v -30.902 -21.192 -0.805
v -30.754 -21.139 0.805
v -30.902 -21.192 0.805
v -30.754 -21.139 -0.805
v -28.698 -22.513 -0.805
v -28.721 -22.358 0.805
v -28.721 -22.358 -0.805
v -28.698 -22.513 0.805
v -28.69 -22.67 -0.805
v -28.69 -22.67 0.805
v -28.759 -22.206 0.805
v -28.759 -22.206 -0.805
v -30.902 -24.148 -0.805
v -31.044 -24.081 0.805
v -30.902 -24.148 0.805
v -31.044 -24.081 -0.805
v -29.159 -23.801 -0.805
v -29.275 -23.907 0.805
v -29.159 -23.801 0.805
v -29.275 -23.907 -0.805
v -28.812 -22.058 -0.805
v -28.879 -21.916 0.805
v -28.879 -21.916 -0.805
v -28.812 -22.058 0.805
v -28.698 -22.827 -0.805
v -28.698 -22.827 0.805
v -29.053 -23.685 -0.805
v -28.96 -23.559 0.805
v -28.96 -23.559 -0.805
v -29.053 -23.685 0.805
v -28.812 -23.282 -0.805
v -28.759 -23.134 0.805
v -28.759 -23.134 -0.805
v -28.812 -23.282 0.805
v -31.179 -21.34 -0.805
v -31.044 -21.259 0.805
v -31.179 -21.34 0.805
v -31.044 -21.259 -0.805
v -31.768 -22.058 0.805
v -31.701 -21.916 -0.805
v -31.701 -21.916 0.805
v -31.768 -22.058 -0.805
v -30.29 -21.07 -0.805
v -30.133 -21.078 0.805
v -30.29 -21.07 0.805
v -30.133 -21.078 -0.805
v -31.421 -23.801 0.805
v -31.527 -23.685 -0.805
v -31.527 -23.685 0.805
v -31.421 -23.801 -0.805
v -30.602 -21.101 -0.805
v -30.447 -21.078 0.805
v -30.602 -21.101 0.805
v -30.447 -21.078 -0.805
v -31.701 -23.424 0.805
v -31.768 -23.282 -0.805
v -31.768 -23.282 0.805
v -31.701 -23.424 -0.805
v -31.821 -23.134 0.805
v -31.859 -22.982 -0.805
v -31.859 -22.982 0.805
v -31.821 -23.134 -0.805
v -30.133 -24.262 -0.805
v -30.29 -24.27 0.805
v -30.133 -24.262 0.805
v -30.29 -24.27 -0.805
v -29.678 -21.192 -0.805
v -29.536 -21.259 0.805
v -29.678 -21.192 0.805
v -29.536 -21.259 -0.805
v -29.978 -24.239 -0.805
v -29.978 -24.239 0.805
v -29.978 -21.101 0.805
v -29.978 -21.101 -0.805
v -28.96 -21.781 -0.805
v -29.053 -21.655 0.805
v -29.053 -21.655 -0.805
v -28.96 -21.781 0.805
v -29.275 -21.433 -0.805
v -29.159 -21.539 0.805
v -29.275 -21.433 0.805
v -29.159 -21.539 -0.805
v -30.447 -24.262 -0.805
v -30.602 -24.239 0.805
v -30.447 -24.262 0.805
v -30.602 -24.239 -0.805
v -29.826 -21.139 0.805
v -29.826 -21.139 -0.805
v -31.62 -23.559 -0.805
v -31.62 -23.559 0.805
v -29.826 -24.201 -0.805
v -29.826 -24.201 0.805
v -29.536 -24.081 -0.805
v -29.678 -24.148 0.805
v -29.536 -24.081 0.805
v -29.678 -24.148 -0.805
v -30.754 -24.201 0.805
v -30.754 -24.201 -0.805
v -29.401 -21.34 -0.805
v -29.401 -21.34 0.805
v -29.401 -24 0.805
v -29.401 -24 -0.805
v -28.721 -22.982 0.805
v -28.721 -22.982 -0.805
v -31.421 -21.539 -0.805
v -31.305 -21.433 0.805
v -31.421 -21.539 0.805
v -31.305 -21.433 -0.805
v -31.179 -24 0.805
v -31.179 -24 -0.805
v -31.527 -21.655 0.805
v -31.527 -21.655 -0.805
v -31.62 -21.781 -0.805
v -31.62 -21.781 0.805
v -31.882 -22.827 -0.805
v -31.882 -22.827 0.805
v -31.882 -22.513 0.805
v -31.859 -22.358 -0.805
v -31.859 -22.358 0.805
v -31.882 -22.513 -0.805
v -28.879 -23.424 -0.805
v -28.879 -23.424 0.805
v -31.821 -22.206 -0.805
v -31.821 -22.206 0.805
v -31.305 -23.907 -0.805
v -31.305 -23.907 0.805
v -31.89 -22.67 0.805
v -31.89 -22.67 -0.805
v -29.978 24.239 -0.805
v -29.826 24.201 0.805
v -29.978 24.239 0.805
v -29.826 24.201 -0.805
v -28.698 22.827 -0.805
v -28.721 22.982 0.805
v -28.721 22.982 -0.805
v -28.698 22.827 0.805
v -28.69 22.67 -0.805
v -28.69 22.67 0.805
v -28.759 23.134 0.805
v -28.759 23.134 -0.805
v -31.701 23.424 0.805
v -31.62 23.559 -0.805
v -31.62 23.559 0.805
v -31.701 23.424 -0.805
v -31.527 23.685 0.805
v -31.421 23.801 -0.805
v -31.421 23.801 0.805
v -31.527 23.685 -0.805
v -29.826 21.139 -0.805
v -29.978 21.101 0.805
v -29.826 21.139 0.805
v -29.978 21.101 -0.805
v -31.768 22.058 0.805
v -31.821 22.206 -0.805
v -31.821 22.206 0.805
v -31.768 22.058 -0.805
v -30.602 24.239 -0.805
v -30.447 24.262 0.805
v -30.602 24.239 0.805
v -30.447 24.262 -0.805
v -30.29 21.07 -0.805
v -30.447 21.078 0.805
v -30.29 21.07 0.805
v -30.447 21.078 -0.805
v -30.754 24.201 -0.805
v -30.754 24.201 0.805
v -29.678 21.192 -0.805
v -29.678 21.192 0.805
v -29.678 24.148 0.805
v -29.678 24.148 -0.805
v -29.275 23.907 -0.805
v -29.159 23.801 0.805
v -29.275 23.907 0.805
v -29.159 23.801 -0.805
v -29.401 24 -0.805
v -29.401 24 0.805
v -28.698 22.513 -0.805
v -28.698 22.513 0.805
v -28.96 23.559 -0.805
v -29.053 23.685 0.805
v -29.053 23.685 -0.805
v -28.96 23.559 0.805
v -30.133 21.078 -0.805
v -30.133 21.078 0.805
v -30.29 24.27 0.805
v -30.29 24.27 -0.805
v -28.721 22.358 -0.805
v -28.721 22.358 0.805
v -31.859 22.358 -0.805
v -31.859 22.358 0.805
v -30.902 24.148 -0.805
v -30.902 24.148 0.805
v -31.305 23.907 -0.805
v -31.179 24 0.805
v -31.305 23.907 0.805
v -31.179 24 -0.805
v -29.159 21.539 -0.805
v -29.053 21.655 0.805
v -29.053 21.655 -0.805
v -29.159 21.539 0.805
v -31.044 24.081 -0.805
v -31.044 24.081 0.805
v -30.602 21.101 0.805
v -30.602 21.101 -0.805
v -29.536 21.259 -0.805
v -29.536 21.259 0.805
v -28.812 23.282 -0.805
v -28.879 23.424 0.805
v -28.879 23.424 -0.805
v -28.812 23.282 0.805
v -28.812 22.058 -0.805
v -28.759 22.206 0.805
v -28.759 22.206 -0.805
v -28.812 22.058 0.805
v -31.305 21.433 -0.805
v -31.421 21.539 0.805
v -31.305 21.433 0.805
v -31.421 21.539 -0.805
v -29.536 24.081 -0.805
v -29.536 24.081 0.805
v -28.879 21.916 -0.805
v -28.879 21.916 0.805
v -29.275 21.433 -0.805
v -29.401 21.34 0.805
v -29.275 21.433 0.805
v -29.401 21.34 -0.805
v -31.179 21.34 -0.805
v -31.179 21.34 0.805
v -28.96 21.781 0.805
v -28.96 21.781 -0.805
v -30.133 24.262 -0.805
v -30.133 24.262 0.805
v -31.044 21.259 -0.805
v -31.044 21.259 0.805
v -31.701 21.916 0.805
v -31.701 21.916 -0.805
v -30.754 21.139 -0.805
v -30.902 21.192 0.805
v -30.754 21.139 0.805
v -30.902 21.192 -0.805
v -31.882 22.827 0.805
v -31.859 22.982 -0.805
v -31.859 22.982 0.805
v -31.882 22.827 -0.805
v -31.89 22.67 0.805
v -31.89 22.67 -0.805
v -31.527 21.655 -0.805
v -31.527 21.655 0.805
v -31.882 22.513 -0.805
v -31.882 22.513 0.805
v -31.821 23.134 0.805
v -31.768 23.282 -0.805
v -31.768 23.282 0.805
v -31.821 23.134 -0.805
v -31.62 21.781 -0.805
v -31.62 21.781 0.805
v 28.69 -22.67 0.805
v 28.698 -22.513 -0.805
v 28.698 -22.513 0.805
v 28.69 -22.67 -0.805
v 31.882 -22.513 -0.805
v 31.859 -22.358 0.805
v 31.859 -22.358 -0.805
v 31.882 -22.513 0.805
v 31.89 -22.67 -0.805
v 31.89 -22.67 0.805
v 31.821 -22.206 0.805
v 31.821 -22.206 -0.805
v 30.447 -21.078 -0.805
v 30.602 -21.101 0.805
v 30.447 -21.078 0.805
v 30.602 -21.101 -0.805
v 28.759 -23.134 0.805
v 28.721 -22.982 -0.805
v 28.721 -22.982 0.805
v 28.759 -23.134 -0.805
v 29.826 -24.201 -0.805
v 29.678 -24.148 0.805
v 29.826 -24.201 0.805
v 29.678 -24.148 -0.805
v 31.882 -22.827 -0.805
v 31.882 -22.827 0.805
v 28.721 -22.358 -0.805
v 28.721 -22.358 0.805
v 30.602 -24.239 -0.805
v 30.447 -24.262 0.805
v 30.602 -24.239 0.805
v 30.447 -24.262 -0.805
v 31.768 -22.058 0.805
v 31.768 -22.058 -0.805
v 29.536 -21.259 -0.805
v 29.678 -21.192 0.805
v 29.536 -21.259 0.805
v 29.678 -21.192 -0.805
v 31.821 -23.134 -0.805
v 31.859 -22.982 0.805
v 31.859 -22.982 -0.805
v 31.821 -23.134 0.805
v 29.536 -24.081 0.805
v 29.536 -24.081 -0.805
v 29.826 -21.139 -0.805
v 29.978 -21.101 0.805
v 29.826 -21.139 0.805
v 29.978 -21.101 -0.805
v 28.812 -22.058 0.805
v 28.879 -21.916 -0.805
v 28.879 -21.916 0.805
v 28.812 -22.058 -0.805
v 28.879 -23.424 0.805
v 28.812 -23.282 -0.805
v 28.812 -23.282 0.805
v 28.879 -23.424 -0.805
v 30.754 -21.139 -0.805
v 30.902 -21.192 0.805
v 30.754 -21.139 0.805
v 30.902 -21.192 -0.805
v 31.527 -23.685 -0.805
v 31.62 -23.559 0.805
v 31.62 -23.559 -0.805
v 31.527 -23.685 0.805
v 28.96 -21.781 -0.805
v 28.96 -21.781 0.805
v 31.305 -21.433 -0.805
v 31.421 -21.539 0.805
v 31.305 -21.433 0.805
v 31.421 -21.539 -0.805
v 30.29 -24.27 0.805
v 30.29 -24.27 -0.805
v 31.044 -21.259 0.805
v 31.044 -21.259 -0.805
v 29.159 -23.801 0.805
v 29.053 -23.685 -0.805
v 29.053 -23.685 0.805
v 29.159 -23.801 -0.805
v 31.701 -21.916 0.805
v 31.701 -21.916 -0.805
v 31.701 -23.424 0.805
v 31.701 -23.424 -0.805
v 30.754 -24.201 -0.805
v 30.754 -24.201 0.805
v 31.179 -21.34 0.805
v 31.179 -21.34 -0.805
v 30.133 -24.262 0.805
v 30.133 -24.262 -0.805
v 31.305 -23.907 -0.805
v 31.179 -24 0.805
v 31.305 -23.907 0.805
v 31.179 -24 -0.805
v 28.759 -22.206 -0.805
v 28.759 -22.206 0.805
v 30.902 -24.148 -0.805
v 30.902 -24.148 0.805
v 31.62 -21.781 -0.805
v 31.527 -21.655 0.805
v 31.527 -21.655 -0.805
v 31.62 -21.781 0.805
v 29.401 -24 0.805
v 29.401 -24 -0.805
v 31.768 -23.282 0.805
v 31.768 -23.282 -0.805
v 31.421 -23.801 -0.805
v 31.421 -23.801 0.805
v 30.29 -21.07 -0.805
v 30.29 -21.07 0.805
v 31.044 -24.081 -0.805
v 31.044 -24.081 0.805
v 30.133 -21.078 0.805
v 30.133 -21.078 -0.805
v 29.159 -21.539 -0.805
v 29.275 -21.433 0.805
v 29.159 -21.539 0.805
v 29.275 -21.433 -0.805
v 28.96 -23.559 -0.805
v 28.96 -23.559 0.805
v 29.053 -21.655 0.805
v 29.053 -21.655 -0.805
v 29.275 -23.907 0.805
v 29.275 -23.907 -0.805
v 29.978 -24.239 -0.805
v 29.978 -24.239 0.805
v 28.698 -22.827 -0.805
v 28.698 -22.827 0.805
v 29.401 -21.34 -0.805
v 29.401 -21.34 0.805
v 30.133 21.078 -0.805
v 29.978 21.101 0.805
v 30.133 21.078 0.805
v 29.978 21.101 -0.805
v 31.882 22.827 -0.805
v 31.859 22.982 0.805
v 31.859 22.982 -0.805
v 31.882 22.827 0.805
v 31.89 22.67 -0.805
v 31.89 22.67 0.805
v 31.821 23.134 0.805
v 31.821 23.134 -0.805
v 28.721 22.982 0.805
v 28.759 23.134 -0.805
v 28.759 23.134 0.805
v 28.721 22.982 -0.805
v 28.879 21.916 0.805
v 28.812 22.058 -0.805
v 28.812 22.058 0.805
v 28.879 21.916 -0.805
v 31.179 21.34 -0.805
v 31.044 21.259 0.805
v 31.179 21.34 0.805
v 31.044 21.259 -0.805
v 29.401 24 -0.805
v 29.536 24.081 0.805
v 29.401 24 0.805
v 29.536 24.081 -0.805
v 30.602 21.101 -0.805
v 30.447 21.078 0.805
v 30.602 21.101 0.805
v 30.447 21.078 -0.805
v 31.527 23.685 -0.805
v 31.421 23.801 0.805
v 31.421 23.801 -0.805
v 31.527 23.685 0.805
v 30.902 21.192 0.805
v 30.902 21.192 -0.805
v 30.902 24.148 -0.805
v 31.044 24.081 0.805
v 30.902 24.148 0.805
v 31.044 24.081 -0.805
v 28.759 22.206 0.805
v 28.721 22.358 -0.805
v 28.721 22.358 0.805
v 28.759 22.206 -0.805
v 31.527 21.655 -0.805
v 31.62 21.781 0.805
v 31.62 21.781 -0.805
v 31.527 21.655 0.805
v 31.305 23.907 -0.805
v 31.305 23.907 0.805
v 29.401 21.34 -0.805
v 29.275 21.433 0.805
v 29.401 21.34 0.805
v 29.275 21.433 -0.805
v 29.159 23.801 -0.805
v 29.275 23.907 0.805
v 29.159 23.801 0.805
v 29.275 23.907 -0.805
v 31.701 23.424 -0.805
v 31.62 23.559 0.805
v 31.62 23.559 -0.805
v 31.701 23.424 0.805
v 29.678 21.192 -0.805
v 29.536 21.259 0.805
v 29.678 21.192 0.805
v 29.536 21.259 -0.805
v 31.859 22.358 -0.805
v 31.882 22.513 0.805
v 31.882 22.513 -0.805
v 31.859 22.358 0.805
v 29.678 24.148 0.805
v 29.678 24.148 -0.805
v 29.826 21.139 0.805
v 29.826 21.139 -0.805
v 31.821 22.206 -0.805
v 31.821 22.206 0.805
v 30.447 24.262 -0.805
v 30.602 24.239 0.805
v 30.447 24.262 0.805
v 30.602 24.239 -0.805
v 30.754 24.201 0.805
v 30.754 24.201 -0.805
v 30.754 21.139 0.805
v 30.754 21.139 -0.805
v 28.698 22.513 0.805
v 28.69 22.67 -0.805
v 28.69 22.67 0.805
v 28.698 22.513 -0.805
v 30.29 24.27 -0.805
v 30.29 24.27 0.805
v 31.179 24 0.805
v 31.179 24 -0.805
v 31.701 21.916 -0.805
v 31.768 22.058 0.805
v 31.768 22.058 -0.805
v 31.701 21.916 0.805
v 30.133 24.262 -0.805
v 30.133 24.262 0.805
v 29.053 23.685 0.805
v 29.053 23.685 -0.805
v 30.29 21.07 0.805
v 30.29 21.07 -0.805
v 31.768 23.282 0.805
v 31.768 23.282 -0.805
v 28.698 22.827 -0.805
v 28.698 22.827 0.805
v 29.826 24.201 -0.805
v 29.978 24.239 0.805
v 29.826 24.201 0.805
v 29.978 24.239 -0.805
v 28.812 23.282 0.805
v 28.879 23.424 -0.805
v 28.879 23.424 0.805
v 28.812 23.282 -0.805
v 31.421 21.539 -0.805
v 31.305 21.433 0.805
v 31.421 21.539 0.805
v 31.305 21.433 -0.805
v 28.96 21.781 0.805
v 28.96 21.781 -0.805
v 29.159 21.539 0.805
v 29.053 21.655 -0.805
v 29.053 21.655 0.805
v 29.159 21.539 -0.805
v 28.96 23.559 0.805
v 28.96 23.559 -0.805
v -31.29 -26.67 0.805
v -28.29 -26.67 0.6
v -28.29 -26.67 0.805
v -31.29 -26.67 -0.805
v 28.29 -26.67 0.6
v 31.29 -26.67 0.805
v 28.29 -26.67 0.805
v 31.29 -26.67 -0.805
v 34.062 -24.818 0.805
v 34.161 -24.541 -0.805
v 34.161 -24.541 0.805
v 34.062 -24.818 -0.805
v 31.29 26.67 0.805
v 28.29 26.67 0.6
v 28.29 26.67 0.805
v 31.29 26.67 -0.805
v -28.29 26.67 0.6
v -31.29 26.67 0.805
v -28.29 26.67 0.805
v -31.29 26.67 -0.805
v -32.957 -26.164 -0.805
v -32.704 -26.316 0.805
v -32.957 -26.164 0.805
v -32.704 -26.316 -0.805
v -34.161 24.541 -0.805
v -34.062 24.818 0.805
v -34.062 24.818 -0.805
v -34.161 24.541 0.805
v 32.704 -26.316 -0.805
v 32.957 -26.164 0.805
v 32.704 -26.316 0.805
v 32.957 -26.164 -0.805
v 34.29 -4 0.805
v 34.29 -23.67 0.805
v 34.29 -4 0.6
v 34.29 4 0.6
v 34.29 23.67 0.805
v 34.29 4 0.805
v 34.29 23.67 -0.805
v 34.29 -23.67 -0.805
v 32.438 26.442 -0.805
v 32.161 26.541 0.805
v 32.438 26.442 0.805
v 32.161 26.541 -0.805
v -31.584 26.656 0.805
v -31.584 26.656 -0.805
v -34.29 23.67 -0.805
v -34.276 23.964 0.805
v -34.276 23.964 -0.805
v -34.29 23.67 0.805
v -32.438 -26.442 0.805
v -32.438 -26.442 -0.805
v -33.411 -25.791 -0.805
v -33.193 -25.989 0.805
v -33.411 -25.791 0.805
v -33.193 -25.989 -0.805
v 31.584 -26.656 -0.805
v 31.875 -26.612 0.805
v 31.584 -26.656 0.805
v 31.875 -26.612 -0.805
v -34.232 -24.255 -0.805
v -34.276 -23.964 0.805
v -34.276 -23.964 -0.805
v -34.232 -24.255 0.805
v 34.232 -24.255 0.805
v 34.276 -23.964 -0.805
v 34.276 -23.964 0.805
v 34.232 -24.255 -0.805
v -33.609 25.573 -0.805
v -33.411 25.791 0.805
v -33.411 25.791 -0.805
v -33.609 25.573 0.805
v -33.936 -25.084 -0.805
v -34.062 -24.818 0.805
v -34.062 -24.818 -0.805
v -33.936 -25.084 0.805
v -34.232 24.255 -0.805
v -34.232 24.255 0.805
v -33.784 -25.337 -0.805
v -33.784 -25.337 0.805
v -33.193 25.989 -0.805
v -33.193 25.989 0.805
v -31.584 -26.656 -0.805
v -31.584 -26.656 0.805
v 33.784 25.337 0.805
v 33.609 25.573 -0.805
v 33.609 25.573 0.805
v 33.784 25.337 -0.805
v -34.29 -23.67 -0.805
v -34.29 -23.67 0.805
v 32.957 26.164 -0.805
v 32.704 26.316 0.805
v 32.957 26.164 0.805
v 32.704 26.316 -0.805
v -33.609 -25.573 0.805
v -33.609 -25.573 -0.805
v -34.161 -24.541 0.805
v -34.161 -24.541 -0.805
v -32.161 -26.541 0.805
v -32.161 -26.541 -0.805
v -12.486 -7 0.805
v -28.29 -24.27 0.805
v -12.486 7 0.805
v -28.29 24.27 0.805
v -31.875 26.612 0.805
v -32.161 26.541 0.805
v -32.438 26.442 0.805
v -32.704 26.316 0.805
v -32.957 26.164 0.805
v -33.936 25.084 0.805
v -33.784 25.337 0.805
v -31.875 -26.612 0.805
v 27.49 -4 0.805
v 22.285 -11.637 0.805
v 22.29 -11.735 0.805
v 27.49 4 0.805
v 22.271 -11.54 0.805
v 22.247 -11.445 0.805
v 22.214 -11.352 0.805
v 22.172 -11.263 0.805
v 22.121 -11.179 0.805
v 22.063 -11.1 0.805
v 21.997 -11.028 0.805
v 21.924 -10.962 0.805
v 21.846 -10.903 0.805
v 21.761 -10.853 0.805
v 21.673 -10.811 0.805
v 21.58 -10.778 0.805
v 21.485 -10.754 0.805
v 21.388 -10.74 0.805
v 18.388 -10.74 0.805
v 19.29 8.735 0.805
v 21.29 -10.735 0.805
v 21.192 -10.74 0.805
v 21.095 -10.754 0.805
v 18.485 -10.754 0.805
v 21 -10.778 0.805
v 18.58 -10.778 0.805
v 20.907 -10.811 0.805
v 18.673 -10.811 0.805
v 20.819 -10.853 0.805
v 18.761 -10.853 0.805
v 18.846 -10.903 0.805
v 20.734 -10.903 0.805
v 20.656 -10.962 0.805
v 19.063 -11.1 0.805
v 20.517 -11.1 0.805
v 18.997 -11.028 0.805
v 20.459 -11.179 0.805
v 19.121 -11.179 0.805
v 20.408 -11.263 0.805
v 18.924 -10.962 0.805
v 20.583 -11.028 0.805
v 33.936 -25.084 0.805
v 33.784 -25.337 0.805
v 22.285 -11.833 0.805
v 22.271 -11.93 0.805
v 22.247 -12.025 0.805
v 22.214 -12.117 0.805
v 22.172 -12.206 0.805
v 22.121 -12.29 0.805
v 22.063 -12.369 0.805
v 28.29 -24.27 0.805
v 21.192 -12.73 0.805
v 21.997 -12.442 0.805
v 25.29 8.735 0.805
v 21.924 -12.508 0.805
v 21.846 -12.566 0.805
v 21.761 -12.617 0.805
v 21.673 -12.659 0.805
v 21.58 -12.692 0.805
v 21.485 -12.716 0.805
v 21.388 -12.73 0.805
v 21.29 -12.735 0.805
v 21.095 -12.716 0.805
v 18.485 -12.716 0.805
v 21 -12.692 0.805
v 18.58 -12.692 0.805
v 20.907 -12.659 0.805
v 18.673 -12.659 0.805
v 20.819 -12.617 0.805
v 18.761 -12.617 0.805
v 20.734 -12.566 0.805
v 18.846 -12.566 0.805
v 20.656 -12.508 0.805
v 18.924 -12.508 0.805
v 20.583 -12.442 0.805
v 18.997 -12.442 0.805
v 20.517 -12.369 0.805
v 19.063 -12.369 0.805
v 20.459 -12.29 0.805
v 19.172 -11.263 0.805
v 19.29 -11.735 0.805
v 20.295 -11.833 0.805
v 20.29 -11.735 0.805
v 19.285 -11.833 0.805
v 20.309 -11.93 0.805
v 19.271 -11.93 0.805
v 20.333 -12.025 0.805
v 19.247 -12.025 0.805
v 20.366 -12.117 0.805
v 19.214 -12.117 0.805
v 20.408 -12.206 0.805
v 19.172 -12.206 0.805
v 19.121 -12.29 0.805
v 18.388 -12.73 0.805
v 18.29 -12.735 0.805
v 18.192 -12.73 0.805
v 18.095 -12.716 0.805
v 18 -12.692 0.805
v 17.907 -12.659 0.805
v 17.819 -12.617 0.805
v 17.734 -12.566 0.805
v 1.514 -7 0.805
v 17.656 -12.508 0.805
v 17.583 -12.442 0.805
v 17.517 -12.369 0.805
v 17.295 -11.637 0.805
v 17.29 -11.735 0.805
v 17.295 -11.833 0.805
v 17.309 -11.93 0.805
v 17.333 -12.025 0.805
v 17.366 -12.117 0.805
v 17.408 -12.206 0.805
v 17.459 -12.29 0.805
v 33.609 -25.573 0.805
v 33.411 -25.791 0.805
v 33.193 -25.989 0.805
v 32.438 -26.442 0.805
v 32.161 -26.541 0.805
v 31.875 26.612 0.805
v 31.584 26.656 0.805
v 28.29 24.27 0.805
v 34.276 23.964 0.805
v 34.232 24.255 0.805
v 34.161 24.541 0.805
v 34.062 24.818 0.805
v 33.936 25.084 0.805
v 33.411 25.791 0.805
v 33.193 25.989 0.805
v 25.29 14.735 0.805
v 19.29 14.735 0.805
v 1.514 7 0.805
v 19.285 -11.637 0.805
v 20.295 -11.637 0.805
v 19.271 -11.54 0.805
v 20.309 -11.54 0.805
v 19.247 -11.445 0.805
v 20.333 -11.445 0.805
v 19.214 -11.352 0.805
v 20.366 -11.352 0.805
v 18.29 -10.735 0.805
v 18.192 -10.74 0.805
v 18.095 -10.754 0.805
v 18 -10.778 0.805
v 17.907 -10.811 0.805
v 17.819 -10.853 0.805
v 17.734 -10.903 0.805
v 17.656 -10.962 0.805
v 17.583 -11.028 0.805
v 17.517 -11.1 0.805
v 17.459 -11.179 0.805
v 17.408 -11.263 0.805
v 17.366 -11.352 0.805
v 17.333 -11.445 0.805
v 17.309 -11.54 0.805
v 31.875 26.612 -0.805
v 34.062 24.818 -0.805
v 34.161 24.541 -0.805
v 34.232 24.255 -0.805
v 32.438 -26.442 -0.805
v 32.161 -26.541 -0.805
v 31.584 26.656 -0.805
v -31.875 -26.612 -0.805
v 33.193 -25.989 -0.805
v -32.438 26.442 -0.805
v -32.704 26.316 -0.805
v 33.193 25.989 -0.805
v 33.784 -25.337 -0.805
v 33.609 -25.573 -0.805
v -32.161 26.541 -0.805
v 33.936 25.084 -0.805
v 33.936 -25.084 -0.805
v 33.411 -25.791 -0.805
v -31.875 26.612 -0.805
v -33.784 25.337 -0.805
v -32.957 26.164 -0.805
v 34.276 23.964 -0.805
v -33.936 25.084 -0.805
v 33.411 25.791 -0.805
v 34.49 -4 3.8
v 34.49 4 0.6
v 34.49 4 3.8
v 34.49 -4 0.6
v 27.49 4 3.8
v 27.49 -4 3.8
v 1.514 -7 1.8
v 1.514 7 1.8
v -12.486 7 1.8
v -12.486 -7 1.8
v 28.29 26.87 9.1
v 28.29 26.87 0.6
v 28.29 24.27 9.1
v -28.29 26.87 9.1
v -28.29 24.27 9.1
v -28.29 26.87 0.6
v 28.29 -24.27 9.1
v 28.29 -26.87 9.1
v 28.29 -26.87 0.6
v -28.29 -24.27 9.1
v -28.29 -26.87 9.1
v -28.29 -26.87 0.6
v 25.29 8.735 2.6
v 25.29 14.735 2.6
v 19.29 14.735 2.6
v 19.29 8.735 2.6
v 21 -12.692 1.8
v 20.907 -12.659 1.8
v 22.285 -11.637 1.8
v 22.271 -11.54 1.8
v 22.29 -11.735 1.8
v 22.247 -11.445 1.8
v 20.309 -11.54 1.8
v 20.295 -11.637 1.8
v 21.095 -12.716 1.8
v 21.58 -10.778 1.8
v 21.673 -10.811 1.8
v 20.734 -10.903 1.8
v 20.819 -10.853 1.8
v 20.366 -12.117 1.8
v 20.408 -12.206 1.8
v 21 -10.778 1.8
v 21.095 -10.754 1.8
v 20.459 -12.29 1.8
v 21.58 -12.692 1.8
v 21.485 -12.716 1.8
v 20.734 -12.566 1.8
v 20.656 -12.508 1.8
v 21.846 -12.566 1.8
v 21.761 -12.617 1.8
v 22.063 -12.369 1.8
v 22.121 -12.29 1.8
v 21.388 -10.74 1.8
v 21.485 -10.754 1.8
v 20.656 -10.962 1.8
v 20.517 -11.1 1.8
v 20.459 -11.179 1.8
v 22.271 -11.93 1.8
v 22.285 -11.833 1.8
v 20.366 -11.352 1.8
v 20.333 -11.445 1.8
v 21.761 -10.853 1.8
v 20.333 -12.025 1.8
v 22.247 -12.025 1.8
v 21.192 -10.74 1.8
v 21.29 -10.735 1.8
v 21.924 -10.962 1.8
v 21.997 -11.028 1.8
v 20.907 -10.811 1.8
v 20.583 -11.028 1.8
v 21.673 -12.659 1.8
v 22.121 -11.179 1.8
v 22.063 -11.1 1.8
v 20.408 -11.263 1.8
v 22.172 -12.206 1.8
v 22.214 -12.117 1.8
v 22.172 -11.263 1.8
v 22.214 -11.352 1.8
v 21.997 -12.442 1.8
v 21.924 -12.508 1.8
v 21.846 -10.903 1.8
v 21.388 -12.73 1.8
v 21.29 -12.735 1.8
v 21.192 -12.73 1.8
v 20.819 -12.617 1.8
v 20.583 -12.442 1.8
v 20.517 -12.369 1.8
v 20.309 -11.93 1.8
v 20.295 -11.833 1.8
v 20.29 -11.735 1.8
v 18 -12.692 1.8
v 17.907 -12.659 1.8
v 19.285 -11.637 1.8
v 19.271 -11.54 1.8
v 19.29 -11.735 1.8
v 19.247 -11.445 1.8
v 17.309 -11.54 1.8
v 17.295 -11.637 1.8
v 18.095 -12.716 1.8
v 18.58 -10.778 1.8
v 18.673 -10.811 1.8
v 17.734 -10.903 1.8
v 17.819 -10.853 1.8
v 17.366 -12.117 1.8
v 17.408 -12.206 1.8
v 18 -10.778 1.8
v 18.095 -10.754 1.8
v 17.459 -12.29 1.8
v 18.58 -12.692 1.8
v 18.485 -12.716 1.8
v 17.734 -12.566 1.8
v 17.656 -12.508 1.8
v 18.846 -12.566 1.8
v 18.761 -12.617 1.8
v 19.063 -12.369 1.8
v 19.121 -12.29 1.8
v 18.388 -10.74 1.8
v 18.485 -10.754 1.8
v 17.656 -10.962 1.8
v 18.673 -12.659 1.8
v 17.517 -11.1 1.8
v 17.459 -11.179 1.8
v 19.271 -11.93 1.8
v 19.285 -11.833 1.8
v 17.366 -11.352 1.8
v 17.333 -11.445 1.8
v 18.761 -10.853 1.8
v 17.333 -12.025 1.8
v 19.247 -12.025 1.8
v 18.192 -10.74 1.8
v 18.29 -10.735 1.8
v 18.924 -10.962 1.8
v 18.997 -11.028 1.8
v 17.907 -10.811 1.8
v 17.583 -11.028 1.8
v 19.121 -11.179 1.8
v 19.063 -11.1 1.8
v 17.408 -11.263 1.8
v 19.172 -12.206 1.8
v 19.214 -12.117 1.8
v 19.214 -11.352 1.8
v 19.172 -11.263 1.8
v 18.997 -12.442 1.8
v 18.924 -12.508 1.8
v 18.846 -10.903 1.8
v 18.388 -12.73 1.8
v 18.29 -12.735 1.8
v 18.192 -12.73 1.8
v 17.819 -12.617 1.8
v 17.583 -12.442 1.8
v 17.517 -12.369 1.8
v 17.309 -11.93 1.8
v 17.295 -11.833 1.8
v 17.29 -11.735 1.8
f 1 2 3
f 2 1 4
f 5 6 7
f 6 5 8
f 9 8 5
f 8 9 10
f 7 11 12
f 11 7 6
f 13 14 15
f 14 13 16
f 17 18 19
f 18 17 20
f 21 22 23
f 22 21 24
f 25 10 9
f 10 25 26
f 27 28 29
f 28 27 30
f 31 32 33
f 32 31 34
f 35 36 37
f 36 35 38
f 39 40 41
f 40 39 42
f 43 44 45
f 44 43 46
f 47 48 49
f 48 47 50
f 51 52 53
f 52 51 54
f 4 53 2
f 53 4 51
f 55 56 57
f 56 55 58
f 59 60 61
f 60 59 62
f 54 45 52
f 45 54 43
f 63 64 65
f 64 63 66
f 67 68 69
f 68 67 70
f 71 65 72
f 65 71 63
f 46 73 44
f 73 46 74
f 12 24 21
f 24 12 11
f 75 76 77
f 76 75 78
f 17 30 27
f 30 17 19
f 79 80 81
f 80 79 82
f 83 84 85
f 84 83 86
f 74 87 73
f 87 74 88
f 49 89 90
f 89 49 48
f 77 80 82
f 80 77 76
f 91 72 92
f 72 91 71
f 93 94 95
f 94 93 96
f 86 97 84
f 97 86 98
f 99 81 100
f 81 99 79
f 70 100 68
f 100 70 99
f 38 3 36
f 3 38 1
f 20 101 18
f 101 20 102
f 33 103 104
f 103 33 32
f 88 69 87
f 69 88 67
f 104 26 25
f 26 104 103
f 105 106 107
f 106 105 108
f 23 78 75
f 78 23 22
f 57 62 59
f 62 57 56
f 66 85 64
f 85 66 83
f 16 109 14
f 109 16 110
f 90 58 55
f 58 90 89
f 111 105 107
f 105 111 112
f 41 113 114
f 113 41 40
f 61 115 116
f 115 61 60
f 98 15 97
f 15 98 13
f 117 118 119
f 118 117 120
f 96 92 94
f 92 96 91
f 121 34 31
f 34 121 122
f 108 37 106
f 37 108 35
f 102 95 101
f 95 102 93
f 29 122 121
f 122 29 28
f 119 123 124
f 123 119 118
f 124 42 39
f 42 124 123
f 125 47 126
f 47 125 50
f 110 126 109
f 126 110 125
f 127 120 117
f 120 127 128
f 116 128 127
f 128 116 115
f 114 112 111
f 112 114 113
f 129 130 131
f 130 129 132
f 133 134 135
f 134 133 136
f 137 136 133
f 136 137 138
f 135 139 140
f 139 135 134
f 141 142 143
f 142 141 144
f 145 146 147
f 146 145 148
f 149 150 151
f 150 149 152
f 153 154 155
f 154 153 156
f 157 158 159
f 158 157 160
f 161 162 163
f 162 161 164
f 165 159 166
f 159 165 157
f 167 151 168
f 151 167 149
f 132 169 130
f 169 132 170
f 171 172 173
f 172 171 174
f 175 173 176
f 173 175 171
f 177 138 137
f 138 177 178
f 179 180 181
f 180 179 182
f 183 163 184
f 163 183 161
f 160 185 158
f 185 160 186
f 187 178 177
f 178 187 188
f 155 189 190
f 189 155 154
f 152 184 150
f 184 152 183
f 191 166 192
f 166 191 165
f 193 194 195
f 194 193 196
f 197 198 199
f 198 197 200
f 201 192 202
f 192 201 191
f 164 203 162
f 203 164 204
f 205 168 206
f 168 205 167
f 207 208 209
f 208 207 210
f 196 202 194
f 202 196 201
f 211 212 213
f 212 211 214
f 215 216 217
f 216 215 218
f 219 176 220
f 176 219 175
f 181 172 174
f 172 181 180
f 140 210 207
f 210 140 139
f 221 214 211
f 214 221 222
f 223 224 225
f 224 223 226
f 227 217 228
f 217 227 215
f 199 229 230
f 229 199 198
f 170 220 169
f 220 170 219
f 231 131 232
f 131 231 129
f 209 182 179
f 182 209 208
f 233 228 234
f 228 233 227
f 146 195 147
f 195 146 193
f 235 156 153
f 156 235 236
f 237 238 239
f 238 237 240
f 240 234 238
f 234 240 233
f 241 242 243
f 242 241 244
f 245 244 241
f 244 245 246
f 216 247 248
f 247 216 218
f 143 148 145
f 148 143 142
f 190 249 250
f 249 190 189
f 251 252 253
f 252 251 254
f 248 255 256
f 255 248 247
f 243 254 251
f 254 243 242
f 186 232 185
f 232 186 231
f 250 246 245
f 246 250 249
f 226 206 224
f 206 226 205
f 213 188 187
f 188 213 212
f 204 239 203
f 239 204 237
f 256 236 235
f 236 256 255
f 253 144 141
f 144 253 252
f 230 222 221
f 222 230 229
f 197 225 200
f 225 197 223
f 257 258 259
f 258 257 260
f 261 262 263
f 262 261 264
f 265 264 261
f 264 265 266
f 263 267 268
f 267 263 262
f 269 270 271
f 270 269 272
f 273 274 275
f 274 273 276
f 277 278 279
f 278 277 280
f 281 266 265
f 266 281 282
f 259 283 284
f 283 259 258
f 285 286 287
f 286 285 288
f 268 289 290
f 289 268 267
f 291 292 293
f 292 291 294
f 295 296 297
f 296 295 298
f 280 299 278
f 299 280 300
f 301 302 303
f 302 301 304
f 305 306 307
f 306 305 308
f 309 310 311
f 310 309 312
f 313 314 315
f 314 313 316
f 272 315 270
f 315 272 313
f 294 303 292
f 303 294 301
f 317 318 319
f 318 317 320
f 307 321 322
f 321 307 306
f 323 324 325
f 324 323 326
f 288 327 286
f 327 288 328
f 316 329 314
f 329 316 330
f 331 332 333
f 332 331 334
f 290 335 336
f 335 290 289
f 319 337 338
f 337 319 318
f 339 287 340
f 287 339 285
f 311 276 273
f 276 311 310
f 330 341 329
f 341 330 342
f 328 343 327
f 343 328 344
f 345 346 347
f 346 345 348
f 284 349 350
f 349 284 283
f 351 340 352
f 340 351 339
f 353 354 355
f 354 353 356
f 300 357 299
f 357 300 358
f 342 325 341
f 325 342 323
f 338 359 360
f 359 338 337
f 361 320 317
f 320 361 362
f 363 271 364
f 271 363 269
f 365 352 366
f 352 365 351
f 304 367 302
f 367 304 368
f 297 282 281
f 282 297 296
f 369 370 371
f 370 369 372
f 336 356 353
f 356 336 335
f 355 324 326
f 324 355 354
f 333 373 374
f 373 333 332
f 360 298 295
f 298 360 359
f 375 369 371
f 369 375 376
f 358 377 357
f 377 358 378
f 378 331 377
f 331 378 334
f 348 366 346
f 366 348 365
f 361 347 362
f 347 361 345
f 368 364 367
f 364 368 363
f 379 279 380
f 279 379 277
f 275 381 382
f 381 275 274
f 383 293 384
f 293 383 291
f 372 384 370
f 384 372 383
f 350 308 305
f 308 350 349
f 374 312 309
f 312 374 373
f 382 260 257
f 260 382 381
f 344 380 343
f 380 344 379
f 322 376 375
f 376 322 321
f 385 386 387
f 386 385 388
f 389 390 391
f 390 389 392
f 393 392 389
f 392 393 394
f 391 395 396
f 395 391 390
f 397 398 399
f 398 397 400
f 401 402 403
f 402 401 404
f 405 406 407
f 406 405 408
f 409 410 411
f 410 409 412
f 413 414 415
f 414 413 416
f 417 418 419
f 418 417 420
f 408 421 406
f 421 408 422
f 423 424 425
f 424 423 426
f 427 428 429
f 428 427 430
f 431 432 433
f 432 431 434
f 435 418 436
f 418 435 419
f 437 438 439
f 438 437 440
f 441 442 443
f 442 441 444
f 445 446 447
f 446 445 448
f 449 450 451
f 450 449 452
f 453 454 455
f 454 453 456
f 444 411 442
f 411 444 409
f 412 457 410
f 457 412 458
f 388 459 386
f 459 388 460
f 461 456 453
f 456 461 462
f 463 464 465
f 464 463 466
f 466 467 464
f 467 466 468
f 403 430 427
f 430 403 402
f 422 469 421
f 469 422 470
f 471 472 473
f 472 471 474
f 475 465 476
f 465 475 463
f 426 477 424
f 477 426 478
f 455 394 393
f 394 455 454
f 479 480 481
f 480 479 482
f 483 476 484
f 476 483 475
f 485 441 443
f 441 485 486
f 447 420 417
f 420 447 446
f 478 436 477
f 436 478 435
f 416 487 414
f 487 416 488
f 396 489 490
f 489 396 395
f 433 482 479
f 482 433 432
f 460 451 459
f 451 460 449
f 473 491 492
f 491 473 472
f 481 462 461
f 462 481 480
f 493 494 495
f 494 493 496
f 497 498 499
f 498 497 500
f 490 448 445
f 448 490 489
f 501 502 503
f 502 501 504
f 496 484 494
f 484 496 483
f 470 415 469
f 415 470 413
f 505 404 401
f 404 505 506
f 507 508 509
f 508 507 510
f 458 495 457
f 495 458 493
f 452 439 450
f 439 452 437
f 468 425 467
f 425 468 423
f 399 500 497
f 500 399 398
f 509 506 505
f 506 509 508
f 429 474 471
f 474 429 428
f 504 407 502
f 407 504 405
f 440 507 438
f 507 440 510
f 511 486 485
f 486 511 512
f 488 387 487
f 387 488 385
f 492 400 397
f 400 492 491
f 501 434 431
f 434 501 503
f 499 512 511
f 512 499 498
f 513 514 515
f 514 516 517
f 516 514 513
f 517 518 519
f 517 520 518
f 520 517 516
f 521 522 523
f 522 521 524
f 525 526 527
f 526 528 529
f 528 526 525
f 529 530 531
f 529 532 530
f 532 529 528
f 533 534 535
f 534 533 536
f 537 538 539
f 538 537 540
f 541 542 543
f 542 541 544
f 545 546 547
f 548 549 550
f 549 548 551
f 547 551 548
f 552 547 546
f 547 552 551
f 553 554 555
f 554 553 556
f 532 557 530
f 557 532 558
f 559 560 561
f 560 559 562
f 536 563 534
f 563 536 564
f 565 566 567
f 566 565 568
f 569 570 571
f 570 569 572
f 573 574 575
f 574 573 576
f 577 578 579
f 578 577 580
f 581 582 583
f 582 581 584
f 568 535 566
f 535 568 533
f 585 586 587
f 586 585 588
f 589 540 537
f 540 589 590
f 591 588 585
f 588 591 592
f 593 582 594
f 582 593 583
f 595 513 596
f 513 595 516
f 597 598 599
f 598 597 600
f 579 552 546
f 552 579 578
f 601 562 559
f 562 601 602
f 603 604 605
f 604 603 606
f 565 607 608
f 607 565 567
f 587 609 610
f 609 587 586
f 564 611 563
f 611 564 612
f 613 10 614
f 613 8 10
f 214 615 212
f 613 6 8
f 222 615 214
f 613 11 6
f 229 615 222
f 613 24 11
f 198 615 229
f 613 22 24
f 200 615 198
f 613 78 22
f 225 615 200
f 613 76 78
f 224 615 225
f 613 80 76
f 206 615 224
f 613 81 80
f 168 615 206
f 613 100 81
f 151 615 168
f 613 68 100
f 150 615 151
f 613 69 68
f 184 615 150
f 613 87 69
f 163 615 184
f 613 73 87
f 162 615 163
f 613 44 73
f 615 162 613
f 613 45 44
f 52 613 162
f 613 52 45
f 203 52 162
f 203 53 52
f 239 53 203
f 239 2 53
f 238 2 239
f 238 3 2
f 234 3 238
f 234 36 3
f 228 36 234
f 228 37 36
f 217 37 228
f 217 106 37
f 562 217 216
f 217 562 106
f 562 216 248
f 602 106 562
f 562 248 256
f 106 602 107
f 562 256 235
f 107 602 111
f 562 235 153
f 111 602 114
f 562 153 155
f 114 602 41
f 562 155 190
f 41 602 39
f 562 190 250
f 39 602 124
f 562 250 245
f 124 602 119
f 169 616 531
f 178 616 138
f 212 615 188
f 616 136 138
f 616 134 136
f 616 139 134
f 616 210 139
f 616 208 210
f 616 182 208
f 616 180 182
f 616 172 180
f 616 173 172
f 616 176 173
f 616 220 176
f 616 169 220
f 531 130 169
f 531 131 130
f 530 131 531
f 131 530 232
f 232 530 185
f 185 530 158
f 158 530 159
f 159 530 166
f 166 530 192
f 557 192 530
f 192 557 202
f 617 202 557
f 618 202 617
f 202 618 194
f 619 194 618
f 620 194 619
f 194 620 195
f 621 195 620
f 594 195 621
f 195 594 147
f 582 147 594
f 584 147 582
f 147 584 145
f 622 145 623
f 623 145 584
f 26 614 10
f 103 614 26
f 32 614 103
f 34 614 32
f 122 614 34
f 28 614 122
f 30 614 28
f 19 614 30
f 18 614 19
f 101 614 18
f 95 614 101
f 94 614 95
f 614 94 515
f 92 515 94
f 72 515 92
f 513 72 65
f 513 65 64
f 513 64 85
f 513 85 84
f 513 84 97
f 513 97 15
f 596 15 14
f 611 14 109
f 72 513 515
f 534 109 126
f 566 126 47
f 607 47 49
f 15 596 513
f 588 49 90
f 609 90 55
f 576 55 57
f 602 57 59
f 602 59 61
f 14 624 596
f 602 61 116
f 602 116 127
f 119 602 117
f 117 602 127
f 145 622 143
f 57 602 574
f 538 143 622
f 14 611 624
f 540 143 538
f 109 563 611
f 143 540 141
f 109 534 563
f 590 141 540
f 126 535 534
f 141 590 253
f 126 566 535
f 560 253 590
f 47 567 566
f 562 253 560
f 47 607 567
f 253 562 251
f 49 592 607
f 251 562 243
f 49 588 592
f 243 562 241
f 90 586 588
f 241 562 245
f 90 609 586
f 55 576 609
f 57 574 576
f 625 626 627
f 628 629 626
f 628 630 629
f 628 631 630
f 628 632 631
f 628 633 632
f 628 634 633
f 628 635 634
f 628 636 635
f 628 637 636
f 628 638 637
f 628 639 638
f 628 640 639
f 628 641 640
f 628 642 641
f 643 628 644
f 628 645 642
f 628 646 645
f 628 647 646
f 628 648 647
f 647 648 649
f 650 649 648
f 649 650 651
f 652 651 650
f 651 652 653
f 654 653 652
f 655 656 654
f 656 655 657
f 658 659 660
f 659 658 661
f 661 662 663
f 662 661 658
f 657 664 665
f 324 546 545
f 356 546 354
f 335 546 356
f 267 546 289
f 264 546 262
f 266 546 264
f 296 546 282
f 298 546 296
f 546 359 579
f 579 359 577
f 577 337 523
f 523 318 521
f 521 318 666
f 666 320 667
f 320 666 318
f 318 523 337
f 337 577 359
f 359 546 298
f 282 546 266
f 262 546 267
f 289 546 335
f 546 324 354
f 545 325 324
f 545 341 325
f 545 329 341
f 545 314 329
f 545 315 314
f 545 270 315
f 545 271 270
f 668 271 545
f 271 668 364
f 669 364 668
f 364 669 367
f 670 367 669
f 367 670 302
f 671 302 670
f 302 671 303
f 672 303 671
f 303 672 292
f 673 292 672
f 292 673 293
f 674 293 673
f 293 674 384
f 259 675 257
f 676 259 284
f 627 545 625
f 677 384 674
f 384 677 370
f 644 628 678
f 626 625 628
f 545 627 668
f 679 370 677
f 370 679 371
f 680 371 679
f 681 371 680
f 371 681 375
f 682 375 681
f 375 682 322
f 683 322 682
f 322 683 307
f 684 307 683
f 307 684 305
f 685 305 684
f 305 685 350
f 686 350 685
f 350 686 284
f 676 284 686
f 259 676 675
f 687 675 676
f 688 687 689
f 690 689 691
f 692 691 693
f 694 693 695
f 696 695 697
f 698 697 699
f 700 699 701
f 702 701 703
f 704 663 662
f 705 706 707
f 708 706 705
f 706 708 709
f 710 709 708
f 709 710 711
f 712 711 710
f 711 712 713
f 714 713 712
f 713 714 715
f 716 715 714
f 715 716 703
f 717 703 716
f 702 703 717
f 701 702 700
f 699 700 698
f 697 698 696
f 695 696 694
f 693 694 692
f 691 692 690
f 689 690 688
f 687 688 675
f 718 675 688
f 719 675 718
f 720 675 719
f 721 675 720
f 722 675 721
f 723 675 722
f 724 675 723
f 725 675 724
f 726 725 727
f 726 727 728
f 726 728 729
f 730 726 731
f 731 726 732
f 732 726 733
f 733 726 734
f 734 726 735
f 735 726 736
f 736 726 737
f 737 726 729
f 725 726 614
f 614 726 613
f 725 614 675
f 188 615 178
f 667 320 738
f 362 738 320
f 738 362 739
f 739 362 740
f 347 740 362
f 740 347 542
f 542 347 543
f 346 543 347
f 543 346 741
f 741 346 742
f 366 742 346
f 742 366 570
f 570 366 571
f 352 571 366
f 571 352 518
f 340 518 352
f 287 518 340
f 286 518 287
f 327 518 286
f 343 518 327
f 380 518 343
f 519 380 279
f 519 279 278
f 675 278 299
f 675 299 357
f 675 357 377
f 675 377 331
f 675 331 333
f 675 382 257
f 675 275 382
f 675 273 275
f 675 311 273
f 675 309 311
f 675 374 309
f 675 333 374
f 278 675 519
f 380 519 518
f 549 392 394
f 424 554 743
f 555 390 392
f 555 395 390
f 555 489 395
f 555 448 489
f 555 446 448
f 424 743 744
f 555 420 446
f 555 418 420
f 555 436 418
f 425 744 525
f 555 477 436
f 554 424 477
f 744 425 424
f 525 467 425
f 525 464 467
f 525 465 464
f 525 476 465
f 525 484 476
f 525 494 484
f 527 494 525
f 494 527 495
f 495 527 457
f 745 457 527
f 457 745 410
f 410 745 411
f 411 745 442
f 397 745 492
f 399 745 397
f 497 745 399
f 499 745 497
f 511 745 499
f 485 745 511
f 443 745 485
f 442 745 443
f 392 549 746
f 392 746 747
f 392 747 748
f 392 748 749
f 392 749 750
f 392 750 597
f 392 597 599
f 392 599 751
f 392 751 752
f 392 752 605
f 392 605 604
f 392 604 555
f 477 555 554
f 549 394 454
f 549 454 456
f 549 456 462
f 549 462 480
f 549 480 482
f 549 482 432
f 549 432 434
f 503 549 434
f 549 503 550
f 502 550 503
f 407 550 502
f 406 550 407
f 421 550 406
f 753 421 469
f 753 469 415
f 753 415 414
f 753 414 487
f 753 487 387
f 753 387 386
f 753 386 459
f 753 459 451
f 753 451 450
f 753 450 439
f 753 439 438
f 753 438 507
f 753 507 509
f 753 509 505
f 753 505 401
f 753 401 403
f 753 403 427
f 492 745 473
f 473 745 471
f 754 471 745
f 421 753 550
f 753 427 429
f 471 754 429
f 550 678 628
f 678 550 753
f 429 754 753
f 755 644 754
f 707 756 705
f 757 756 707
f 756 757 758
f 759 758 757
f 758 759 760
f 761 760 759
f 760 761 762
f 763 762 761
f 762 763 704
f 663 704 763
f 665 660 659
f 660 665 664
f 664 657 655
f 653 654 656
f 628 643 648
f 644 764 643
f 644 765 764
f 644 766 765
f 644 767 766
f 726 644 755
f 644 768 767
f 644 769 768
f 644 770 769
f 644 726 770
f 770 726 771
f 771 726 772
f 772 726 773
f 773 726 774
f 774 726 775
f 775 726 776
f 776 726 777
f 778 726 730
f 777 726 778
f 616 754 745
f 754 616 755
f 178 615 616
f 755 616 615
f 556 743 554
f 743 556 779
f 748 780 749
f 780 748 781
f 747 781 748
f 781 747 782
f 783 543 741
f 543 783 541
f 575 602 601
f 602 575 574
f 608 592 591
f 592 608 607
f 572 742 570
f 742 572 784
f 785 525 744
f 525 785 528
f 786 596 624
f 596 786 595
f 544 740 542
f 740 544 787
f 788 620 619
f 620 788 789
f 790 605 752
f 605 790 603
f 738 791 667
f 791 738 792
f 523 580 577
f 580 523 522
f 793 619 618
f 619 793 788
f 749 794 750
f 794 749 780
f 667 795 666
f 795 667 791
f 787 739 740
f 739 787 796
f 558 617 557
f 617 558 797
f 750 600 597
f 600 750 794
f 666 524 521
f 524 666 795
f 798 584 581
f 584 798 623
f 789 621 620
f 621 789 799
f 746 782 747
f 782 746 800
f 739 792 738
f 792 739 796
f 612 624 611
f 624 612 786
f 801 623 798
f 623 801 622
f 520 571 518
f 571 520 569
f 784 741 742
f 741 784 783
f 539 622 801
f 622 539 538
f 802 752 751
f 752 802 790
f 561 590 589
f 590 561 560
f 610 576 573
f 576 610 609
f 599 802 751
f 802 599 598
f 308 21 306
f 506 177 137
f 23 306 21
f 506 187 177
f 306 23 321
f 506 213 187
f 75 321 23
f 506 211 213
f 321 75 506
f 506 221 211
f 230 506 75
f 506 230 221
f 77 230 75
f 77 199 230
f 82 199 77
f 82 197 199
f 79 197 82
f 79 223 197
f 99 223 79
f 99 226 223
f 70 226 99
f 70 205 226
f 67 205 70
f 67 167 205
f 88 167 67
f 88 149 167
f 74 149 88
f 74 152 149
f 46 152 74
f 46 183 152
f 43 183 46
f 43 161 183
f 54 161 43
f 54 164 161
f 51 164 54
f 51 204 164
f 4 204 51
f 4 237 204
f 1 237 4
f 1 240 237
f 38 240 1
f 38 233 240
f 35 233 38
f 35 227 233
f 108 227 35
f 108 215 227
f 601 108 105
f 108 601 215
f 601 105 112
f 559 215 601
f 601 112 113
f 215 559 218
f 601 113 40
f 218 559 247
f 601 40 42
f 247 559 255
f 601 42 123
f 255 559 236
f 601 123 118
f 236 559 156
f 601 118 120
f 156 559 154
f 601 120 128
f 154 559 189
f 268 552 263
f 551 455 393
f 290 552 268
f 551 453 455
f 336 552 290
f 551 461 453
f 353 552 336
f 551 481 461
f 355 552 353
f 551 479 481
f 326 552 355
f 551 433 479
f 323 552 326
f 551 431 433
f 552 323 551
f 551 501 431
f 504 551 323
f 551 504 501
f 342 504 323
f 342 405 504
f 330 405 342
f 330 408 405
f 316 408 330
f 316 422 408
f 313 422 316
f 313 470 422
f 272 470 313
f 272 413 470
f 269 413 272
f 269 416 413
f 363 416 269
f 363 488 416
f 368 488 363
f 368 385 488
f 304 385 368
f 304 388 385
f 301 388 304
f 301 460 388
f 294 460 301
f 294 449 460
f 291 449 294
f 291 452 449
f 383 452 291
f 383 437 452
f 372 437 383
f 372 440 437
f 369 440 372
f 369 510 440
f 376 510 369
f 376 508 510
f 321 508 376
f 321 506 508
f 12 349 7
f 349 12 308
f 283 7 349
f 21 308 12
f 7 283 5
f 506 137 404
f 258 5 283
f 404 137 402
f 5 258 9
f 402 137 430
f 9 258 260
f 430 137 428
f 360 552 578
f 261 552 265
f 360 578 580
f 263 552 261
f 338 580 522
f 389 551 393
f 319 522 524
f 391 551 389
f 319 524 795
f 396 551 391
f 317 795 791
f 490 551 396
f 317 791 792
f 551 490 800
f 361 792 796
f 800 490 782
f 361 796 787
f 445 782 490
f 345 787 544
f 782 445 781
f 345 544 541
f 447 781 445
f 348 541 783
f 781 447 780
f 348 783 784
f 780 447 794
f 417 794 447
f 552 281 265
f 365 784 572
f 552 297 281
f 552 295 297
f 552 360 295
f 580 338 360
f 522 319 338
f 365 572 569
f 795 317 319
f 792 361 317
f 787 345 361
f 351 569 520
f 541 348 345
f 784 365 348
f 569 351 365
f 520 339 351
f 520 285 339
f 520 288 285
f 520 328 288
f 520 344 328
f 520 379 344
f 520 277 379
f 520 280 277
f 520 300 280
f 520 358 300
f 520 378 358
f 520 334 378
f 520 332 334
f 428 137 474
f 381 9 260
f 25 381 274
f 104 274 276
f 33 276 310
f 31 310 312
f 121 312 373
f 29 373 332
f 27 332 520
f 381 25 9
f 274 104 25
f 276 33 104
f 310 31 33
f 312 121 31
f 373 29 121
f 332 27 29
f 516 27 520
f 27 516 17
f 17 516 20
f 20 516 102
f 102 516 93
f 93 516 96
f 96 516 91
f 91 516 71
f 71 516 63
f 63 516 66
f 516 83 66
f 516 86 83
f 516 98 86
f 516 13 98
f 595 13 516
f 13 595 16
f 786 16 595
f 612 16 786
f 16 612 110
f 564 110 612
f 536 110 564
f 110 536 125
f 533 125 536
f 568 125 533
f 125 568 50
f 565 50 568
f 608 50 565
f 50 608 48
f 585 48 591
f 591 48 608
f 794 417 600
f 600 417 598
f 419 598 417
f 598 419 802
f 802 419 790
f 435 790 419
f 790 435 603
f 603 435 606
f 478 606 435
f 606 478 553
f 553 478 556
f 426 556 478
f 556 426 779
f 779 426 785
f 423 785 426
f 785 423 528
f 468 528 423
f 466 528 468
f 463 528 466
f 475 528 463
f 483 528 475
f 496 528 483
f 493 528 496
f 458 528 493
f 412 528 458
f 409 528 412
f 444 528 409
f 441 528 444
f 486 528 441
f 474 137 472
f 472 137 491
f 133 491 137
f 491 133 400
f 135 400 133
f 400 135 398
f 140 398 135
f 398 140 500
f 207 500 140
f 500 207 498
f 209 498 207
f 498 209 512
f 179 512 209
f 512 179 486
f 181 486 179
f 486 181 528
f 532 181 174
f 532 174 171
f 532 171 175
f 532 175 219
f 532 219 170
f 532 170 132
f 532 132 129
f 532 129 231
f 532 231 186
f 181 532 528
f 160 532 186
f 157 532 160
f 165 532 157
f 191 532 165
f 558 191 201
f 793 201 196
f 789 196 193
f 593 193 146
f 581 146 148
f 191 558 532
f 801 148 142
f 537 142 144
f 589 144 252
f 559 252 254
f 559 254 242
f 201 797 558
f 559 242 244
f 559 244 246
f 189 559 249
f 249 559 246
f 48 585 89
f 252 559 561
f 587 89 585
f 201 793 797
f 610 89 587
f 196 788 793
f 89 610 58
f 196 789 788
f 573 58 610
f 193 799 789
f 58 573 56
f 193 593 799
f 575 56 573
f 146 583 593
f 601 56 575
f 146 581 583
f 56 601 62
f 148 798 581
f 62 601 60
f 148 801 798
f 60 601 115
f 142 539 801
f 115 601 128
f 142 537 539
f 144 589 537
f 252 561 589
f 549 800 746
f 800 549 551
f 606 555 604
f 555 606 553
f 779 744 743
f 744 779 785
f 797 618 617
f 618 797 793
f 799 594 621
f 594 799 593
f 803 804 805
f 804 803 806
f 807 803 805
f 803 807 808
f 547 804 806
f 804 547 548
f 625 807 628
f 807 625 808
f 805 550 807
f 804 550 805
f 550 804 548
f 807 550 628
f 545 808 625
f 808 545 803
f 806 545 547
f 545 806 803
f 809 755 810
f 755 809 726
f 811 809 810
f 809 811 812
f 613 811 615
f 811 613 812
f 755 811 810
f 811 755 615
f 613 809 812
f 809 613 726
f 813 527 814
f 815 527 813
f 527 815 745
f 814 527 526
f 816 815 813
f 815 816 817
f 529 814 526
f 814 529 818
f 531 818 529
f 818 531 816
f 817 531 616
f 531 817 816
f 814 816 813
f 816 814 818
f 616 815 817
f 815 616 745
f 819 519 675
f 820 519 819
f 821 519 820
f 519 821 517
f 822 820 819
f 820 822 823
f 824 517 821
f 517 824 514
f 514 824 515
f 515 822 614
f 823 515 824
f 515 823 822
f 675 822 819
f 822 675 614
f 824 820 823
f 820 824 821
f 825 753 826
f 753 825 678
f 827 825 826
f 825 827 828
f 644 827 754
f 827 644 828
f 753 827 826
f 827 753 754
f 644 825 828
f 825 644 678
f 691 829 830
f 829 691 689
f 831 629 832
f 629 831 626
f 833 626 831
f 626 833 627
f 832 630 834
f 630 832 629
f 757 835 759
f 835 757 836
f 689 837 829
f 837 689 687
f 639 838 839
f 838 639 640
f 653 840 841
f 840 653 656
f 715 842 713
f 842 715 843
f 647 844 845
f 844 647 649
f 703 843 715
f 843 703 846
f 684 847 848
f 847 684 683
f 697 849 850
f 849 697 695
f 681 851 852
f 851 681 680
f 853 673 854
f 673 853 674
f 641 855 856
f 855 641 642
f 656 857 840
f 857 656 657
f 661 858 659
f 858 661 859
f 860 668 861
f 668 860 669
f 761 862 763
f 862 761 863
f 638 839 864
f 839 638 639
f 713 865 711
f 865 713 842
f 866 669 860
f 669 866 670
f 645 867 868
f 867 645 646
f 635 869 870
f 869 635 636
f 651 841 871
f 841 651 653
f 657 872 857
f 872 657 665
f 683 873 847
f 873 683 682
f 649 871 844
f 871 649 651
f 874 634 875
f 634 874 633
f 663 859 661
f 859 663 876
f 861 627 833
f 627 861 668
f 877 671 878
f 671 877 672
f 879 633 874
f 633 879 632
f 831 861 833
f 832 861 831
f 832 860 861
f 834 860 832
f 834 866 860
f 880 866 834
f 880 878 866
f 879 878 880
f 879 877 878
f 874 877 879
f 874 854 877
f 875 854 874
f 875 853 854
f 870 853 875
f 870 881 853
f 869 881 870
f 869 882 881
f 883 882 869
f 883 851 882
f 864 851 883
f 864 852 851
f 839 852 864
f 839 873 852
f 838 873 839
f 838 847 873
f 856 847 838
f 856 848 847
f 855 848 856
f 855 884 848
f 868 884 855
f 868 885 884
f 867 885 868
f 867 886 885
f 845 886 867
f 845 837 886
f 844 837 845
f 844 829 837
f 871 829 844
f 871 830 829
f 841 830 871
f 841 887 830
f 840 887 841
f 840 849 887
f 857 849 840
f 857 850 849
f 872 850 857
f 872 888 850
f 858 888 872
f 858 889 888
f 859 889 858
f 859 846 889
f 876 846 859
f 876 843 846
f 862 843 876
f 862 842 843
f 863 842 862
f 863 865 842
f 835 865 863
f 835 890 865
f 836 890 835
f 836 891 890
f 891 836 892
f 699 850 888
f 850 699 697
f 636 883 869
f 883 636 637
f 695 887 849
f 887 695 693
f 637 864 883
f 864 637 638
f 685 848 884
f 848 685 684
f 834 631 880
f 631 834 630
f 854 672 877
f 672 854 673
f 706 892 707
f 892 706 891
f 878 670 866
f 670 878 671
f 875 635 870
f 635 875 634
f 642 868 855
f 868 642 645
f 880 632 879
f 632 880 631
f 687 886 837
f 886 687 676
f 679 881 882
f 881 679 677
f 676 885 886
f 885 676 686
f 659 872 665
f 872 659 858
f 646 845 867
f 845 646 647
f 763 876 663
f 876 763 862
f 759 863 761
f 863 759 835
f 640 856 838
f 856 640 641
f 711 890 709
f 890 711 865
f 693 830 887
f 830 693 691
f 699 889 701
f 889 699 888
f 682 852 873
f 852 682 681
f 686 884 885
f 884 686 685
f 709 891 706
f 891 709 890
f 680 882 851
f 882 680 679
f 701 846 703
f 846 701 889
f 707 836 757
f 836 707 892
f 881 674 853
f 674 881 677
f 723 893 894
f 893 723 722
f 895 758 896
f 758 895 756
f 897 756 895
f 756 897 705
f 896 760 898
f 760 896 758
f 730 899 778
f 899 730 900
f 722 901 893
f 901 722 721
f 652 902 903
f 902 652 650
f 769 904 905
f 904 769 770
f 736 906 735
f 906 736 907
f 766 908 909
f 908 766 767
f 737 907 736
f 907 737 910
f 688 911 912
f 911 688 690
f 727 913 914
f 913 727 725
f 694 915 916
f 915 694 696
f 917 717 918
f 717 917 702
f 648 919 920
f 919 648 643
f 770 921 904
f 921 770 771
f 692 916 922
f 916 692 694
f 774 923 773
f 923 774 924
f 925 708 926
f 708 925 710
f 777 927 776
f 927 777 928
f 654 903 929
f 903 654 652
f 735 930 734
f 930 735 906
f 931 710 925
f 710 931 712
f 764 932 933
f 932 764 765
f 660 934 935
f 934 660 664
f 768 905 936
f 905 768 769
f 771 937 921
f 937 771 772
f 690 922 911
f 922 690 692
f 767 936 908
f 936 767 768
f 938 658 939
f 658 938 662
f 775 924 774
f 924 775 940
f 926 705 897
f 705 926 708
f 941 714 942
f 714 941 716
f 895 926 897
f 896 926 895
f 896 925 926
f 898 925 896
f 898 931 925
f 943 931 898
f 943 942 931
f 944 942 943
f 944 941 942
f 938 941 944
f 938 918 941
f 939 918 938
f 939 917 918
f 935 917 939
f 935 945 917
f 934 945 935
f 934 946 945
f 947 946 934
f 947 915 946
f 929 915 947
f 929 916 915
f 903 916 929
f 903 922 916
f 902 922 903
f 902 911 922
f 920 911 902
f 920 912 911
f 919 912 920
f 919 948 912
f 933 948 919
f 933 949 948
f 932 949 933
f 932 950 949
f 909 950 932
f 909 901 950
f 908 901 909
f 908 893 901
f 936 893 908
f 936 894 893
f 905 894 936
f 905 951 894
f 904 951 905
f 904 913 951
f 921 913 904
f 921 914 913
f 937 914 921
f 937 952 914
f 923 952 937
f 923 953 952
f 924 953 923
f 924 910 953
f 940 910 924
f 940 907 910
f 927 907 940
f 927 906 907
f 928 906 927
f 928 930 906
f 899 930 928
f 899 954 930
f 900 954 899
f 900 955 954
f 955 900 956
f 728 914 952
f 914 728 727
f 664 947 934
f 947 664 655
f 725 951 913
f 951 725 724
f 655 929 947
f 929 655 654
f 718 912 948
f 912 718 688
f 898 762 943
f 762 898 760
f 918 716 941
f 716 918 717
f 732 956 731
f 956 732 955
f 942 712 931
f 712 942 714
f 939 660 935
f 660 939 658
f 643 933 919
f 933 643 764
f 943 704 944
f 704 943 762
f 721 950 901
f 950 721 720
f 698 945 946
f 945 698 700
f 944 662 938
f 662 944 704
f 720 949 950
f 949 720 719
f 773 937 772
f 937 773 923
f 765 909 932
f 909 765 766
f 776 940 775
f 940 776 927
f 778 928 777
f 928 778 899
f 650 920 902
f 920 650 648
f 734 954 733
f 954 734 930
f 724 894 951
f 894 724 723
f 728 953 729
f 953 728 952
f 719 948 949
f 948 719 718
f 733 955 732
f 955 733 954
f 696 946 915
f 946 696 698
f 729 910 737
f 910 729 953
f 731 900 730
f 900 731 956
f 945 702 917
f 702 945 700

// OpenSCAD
$fn = 64;

// Exact requested PCB dimensions
pcb_length = 68.58;
pcb_width  = 53.34;
pcb_thickness = 1.6;

// Feature parameters (generic dev board look)
corner_r = 3.0;                 // rounded corners
hole_r = 1.6;                   // ~3.2mm mounting holes
hole_edge_clear = 4.0;          // hole center offset from edges

overlap = 0.2;                  // ensures all added parts intersect PCB (one connected solid)

// Component heights (above PCB top)
usb_h = 3.2;
usb_w = 8.0;
usb_l = 7.0;

mcu_h = 1.2;
mcu_l = 14.0;
mcu_w = 14.0;

header_h = 8.5;
header_w = 2.6;

led_h = 1.2;
led_r = 1.0;

button_h = 2.0;
button_xy = 6.0;

// Helpers
module rounded_rect_prism(l, w, h, r) {
    // Minkowski gives rounded corners; keep r <= min(l,w)/2
    minkowski() {
        cube([l - 2*r, w - 2*r, h], center=true);
        cylinder(r=r, h=0.01, center=true);
    }
}

module pcb_body() {
    color([0.0, 0.4, 0.2])
    difference() {
        rounded_rect_prism(pcb_length, pcb_width, pcb_thickness, corner_r);

        // 4 mounting holes (through)
        for (sx = [-1, 1], sy = [-1, 1]) {
            translate([
                sx*(pcb_length/2 - hole_edge_clear),
                sy*(pcb_width/2  - hole_edge_clear),
                0
            ])
            cylinder(r=hole_r, h=pcb_thickness + 2, center=true);
        }
    }
}

module usb_connector() {
    // Place on +X edge, centered in Y, sitting on top of PCB with slight overlap
    translate([
        pcb_length/2 - usb_l/2 + overlap,
        0,
        pcb_thickness/2 + usb_h/2 - overlap
    ])
    color([0.75, 0.75, 0.75])
    cube([usb_l, usb_w, usb_h], center=true);
}

module mcu_chip() {
    // Center-ish on board
    translate([
        -pcb_length*0.08,
        0,
        pcb_thickness/2 + mcu_h/2 - overlap
    ])
    color([0.1, 0.1, 0.1])
    cube([mcu_l, mcu_w, mcu_h], center=true);
}

module header_strip(side = 1) {
    // side = +1 for +Y edge, -1 for -Y edge
    header_len = pcb_length - 2*6.0;
    translate([
        0,
        side*(pcb_width/2 - header_w/2 + overlap),
        pcb_thickness/2 + header_h/2 - overlap
    ])
    color([0.05, 0.05, 0.05])
    cube([header_len, header_w, header_h], center=true);
}

module led_indicator(xpos, ypos) {
    translate([
        xpos,
        ypos,
        pcb_thickness/2 + led_h/2 - overlap
    ])
    color([0.8, 0.1, 0.1])
    cylinder(r=led_r, h=led_h, center=true);
}

module reset_button() {
    // Near USB connector
    translate([
        pcb_length/2 - usb_l - button_xy/2 - 2.0,
        pcb_width*0.22,
        pcb_thickness/2 + button_h/2 - overlap
    ])
    color([0.2, 0.2, 0.2])
    cube([button_xy, button_xy, button_h], center=true);
}

module board_complete() {
    union() {
        pcb_body();

        // Components (all intersect PCB slightly to ensure one connected solid)
        usb_connector();
        mcu_chip();
        header_strip(+1);
        header_strip(-1);
        reset_button();

        // A couple LEDs
        led_indicator(pcb_length/2 - usb_l - 6.0, -pcb_width*0.22);
        led_indicator(pcb_length/2 - usb_l - 9.0, -pcb_width*0.22);
    }
}

board_complete();
